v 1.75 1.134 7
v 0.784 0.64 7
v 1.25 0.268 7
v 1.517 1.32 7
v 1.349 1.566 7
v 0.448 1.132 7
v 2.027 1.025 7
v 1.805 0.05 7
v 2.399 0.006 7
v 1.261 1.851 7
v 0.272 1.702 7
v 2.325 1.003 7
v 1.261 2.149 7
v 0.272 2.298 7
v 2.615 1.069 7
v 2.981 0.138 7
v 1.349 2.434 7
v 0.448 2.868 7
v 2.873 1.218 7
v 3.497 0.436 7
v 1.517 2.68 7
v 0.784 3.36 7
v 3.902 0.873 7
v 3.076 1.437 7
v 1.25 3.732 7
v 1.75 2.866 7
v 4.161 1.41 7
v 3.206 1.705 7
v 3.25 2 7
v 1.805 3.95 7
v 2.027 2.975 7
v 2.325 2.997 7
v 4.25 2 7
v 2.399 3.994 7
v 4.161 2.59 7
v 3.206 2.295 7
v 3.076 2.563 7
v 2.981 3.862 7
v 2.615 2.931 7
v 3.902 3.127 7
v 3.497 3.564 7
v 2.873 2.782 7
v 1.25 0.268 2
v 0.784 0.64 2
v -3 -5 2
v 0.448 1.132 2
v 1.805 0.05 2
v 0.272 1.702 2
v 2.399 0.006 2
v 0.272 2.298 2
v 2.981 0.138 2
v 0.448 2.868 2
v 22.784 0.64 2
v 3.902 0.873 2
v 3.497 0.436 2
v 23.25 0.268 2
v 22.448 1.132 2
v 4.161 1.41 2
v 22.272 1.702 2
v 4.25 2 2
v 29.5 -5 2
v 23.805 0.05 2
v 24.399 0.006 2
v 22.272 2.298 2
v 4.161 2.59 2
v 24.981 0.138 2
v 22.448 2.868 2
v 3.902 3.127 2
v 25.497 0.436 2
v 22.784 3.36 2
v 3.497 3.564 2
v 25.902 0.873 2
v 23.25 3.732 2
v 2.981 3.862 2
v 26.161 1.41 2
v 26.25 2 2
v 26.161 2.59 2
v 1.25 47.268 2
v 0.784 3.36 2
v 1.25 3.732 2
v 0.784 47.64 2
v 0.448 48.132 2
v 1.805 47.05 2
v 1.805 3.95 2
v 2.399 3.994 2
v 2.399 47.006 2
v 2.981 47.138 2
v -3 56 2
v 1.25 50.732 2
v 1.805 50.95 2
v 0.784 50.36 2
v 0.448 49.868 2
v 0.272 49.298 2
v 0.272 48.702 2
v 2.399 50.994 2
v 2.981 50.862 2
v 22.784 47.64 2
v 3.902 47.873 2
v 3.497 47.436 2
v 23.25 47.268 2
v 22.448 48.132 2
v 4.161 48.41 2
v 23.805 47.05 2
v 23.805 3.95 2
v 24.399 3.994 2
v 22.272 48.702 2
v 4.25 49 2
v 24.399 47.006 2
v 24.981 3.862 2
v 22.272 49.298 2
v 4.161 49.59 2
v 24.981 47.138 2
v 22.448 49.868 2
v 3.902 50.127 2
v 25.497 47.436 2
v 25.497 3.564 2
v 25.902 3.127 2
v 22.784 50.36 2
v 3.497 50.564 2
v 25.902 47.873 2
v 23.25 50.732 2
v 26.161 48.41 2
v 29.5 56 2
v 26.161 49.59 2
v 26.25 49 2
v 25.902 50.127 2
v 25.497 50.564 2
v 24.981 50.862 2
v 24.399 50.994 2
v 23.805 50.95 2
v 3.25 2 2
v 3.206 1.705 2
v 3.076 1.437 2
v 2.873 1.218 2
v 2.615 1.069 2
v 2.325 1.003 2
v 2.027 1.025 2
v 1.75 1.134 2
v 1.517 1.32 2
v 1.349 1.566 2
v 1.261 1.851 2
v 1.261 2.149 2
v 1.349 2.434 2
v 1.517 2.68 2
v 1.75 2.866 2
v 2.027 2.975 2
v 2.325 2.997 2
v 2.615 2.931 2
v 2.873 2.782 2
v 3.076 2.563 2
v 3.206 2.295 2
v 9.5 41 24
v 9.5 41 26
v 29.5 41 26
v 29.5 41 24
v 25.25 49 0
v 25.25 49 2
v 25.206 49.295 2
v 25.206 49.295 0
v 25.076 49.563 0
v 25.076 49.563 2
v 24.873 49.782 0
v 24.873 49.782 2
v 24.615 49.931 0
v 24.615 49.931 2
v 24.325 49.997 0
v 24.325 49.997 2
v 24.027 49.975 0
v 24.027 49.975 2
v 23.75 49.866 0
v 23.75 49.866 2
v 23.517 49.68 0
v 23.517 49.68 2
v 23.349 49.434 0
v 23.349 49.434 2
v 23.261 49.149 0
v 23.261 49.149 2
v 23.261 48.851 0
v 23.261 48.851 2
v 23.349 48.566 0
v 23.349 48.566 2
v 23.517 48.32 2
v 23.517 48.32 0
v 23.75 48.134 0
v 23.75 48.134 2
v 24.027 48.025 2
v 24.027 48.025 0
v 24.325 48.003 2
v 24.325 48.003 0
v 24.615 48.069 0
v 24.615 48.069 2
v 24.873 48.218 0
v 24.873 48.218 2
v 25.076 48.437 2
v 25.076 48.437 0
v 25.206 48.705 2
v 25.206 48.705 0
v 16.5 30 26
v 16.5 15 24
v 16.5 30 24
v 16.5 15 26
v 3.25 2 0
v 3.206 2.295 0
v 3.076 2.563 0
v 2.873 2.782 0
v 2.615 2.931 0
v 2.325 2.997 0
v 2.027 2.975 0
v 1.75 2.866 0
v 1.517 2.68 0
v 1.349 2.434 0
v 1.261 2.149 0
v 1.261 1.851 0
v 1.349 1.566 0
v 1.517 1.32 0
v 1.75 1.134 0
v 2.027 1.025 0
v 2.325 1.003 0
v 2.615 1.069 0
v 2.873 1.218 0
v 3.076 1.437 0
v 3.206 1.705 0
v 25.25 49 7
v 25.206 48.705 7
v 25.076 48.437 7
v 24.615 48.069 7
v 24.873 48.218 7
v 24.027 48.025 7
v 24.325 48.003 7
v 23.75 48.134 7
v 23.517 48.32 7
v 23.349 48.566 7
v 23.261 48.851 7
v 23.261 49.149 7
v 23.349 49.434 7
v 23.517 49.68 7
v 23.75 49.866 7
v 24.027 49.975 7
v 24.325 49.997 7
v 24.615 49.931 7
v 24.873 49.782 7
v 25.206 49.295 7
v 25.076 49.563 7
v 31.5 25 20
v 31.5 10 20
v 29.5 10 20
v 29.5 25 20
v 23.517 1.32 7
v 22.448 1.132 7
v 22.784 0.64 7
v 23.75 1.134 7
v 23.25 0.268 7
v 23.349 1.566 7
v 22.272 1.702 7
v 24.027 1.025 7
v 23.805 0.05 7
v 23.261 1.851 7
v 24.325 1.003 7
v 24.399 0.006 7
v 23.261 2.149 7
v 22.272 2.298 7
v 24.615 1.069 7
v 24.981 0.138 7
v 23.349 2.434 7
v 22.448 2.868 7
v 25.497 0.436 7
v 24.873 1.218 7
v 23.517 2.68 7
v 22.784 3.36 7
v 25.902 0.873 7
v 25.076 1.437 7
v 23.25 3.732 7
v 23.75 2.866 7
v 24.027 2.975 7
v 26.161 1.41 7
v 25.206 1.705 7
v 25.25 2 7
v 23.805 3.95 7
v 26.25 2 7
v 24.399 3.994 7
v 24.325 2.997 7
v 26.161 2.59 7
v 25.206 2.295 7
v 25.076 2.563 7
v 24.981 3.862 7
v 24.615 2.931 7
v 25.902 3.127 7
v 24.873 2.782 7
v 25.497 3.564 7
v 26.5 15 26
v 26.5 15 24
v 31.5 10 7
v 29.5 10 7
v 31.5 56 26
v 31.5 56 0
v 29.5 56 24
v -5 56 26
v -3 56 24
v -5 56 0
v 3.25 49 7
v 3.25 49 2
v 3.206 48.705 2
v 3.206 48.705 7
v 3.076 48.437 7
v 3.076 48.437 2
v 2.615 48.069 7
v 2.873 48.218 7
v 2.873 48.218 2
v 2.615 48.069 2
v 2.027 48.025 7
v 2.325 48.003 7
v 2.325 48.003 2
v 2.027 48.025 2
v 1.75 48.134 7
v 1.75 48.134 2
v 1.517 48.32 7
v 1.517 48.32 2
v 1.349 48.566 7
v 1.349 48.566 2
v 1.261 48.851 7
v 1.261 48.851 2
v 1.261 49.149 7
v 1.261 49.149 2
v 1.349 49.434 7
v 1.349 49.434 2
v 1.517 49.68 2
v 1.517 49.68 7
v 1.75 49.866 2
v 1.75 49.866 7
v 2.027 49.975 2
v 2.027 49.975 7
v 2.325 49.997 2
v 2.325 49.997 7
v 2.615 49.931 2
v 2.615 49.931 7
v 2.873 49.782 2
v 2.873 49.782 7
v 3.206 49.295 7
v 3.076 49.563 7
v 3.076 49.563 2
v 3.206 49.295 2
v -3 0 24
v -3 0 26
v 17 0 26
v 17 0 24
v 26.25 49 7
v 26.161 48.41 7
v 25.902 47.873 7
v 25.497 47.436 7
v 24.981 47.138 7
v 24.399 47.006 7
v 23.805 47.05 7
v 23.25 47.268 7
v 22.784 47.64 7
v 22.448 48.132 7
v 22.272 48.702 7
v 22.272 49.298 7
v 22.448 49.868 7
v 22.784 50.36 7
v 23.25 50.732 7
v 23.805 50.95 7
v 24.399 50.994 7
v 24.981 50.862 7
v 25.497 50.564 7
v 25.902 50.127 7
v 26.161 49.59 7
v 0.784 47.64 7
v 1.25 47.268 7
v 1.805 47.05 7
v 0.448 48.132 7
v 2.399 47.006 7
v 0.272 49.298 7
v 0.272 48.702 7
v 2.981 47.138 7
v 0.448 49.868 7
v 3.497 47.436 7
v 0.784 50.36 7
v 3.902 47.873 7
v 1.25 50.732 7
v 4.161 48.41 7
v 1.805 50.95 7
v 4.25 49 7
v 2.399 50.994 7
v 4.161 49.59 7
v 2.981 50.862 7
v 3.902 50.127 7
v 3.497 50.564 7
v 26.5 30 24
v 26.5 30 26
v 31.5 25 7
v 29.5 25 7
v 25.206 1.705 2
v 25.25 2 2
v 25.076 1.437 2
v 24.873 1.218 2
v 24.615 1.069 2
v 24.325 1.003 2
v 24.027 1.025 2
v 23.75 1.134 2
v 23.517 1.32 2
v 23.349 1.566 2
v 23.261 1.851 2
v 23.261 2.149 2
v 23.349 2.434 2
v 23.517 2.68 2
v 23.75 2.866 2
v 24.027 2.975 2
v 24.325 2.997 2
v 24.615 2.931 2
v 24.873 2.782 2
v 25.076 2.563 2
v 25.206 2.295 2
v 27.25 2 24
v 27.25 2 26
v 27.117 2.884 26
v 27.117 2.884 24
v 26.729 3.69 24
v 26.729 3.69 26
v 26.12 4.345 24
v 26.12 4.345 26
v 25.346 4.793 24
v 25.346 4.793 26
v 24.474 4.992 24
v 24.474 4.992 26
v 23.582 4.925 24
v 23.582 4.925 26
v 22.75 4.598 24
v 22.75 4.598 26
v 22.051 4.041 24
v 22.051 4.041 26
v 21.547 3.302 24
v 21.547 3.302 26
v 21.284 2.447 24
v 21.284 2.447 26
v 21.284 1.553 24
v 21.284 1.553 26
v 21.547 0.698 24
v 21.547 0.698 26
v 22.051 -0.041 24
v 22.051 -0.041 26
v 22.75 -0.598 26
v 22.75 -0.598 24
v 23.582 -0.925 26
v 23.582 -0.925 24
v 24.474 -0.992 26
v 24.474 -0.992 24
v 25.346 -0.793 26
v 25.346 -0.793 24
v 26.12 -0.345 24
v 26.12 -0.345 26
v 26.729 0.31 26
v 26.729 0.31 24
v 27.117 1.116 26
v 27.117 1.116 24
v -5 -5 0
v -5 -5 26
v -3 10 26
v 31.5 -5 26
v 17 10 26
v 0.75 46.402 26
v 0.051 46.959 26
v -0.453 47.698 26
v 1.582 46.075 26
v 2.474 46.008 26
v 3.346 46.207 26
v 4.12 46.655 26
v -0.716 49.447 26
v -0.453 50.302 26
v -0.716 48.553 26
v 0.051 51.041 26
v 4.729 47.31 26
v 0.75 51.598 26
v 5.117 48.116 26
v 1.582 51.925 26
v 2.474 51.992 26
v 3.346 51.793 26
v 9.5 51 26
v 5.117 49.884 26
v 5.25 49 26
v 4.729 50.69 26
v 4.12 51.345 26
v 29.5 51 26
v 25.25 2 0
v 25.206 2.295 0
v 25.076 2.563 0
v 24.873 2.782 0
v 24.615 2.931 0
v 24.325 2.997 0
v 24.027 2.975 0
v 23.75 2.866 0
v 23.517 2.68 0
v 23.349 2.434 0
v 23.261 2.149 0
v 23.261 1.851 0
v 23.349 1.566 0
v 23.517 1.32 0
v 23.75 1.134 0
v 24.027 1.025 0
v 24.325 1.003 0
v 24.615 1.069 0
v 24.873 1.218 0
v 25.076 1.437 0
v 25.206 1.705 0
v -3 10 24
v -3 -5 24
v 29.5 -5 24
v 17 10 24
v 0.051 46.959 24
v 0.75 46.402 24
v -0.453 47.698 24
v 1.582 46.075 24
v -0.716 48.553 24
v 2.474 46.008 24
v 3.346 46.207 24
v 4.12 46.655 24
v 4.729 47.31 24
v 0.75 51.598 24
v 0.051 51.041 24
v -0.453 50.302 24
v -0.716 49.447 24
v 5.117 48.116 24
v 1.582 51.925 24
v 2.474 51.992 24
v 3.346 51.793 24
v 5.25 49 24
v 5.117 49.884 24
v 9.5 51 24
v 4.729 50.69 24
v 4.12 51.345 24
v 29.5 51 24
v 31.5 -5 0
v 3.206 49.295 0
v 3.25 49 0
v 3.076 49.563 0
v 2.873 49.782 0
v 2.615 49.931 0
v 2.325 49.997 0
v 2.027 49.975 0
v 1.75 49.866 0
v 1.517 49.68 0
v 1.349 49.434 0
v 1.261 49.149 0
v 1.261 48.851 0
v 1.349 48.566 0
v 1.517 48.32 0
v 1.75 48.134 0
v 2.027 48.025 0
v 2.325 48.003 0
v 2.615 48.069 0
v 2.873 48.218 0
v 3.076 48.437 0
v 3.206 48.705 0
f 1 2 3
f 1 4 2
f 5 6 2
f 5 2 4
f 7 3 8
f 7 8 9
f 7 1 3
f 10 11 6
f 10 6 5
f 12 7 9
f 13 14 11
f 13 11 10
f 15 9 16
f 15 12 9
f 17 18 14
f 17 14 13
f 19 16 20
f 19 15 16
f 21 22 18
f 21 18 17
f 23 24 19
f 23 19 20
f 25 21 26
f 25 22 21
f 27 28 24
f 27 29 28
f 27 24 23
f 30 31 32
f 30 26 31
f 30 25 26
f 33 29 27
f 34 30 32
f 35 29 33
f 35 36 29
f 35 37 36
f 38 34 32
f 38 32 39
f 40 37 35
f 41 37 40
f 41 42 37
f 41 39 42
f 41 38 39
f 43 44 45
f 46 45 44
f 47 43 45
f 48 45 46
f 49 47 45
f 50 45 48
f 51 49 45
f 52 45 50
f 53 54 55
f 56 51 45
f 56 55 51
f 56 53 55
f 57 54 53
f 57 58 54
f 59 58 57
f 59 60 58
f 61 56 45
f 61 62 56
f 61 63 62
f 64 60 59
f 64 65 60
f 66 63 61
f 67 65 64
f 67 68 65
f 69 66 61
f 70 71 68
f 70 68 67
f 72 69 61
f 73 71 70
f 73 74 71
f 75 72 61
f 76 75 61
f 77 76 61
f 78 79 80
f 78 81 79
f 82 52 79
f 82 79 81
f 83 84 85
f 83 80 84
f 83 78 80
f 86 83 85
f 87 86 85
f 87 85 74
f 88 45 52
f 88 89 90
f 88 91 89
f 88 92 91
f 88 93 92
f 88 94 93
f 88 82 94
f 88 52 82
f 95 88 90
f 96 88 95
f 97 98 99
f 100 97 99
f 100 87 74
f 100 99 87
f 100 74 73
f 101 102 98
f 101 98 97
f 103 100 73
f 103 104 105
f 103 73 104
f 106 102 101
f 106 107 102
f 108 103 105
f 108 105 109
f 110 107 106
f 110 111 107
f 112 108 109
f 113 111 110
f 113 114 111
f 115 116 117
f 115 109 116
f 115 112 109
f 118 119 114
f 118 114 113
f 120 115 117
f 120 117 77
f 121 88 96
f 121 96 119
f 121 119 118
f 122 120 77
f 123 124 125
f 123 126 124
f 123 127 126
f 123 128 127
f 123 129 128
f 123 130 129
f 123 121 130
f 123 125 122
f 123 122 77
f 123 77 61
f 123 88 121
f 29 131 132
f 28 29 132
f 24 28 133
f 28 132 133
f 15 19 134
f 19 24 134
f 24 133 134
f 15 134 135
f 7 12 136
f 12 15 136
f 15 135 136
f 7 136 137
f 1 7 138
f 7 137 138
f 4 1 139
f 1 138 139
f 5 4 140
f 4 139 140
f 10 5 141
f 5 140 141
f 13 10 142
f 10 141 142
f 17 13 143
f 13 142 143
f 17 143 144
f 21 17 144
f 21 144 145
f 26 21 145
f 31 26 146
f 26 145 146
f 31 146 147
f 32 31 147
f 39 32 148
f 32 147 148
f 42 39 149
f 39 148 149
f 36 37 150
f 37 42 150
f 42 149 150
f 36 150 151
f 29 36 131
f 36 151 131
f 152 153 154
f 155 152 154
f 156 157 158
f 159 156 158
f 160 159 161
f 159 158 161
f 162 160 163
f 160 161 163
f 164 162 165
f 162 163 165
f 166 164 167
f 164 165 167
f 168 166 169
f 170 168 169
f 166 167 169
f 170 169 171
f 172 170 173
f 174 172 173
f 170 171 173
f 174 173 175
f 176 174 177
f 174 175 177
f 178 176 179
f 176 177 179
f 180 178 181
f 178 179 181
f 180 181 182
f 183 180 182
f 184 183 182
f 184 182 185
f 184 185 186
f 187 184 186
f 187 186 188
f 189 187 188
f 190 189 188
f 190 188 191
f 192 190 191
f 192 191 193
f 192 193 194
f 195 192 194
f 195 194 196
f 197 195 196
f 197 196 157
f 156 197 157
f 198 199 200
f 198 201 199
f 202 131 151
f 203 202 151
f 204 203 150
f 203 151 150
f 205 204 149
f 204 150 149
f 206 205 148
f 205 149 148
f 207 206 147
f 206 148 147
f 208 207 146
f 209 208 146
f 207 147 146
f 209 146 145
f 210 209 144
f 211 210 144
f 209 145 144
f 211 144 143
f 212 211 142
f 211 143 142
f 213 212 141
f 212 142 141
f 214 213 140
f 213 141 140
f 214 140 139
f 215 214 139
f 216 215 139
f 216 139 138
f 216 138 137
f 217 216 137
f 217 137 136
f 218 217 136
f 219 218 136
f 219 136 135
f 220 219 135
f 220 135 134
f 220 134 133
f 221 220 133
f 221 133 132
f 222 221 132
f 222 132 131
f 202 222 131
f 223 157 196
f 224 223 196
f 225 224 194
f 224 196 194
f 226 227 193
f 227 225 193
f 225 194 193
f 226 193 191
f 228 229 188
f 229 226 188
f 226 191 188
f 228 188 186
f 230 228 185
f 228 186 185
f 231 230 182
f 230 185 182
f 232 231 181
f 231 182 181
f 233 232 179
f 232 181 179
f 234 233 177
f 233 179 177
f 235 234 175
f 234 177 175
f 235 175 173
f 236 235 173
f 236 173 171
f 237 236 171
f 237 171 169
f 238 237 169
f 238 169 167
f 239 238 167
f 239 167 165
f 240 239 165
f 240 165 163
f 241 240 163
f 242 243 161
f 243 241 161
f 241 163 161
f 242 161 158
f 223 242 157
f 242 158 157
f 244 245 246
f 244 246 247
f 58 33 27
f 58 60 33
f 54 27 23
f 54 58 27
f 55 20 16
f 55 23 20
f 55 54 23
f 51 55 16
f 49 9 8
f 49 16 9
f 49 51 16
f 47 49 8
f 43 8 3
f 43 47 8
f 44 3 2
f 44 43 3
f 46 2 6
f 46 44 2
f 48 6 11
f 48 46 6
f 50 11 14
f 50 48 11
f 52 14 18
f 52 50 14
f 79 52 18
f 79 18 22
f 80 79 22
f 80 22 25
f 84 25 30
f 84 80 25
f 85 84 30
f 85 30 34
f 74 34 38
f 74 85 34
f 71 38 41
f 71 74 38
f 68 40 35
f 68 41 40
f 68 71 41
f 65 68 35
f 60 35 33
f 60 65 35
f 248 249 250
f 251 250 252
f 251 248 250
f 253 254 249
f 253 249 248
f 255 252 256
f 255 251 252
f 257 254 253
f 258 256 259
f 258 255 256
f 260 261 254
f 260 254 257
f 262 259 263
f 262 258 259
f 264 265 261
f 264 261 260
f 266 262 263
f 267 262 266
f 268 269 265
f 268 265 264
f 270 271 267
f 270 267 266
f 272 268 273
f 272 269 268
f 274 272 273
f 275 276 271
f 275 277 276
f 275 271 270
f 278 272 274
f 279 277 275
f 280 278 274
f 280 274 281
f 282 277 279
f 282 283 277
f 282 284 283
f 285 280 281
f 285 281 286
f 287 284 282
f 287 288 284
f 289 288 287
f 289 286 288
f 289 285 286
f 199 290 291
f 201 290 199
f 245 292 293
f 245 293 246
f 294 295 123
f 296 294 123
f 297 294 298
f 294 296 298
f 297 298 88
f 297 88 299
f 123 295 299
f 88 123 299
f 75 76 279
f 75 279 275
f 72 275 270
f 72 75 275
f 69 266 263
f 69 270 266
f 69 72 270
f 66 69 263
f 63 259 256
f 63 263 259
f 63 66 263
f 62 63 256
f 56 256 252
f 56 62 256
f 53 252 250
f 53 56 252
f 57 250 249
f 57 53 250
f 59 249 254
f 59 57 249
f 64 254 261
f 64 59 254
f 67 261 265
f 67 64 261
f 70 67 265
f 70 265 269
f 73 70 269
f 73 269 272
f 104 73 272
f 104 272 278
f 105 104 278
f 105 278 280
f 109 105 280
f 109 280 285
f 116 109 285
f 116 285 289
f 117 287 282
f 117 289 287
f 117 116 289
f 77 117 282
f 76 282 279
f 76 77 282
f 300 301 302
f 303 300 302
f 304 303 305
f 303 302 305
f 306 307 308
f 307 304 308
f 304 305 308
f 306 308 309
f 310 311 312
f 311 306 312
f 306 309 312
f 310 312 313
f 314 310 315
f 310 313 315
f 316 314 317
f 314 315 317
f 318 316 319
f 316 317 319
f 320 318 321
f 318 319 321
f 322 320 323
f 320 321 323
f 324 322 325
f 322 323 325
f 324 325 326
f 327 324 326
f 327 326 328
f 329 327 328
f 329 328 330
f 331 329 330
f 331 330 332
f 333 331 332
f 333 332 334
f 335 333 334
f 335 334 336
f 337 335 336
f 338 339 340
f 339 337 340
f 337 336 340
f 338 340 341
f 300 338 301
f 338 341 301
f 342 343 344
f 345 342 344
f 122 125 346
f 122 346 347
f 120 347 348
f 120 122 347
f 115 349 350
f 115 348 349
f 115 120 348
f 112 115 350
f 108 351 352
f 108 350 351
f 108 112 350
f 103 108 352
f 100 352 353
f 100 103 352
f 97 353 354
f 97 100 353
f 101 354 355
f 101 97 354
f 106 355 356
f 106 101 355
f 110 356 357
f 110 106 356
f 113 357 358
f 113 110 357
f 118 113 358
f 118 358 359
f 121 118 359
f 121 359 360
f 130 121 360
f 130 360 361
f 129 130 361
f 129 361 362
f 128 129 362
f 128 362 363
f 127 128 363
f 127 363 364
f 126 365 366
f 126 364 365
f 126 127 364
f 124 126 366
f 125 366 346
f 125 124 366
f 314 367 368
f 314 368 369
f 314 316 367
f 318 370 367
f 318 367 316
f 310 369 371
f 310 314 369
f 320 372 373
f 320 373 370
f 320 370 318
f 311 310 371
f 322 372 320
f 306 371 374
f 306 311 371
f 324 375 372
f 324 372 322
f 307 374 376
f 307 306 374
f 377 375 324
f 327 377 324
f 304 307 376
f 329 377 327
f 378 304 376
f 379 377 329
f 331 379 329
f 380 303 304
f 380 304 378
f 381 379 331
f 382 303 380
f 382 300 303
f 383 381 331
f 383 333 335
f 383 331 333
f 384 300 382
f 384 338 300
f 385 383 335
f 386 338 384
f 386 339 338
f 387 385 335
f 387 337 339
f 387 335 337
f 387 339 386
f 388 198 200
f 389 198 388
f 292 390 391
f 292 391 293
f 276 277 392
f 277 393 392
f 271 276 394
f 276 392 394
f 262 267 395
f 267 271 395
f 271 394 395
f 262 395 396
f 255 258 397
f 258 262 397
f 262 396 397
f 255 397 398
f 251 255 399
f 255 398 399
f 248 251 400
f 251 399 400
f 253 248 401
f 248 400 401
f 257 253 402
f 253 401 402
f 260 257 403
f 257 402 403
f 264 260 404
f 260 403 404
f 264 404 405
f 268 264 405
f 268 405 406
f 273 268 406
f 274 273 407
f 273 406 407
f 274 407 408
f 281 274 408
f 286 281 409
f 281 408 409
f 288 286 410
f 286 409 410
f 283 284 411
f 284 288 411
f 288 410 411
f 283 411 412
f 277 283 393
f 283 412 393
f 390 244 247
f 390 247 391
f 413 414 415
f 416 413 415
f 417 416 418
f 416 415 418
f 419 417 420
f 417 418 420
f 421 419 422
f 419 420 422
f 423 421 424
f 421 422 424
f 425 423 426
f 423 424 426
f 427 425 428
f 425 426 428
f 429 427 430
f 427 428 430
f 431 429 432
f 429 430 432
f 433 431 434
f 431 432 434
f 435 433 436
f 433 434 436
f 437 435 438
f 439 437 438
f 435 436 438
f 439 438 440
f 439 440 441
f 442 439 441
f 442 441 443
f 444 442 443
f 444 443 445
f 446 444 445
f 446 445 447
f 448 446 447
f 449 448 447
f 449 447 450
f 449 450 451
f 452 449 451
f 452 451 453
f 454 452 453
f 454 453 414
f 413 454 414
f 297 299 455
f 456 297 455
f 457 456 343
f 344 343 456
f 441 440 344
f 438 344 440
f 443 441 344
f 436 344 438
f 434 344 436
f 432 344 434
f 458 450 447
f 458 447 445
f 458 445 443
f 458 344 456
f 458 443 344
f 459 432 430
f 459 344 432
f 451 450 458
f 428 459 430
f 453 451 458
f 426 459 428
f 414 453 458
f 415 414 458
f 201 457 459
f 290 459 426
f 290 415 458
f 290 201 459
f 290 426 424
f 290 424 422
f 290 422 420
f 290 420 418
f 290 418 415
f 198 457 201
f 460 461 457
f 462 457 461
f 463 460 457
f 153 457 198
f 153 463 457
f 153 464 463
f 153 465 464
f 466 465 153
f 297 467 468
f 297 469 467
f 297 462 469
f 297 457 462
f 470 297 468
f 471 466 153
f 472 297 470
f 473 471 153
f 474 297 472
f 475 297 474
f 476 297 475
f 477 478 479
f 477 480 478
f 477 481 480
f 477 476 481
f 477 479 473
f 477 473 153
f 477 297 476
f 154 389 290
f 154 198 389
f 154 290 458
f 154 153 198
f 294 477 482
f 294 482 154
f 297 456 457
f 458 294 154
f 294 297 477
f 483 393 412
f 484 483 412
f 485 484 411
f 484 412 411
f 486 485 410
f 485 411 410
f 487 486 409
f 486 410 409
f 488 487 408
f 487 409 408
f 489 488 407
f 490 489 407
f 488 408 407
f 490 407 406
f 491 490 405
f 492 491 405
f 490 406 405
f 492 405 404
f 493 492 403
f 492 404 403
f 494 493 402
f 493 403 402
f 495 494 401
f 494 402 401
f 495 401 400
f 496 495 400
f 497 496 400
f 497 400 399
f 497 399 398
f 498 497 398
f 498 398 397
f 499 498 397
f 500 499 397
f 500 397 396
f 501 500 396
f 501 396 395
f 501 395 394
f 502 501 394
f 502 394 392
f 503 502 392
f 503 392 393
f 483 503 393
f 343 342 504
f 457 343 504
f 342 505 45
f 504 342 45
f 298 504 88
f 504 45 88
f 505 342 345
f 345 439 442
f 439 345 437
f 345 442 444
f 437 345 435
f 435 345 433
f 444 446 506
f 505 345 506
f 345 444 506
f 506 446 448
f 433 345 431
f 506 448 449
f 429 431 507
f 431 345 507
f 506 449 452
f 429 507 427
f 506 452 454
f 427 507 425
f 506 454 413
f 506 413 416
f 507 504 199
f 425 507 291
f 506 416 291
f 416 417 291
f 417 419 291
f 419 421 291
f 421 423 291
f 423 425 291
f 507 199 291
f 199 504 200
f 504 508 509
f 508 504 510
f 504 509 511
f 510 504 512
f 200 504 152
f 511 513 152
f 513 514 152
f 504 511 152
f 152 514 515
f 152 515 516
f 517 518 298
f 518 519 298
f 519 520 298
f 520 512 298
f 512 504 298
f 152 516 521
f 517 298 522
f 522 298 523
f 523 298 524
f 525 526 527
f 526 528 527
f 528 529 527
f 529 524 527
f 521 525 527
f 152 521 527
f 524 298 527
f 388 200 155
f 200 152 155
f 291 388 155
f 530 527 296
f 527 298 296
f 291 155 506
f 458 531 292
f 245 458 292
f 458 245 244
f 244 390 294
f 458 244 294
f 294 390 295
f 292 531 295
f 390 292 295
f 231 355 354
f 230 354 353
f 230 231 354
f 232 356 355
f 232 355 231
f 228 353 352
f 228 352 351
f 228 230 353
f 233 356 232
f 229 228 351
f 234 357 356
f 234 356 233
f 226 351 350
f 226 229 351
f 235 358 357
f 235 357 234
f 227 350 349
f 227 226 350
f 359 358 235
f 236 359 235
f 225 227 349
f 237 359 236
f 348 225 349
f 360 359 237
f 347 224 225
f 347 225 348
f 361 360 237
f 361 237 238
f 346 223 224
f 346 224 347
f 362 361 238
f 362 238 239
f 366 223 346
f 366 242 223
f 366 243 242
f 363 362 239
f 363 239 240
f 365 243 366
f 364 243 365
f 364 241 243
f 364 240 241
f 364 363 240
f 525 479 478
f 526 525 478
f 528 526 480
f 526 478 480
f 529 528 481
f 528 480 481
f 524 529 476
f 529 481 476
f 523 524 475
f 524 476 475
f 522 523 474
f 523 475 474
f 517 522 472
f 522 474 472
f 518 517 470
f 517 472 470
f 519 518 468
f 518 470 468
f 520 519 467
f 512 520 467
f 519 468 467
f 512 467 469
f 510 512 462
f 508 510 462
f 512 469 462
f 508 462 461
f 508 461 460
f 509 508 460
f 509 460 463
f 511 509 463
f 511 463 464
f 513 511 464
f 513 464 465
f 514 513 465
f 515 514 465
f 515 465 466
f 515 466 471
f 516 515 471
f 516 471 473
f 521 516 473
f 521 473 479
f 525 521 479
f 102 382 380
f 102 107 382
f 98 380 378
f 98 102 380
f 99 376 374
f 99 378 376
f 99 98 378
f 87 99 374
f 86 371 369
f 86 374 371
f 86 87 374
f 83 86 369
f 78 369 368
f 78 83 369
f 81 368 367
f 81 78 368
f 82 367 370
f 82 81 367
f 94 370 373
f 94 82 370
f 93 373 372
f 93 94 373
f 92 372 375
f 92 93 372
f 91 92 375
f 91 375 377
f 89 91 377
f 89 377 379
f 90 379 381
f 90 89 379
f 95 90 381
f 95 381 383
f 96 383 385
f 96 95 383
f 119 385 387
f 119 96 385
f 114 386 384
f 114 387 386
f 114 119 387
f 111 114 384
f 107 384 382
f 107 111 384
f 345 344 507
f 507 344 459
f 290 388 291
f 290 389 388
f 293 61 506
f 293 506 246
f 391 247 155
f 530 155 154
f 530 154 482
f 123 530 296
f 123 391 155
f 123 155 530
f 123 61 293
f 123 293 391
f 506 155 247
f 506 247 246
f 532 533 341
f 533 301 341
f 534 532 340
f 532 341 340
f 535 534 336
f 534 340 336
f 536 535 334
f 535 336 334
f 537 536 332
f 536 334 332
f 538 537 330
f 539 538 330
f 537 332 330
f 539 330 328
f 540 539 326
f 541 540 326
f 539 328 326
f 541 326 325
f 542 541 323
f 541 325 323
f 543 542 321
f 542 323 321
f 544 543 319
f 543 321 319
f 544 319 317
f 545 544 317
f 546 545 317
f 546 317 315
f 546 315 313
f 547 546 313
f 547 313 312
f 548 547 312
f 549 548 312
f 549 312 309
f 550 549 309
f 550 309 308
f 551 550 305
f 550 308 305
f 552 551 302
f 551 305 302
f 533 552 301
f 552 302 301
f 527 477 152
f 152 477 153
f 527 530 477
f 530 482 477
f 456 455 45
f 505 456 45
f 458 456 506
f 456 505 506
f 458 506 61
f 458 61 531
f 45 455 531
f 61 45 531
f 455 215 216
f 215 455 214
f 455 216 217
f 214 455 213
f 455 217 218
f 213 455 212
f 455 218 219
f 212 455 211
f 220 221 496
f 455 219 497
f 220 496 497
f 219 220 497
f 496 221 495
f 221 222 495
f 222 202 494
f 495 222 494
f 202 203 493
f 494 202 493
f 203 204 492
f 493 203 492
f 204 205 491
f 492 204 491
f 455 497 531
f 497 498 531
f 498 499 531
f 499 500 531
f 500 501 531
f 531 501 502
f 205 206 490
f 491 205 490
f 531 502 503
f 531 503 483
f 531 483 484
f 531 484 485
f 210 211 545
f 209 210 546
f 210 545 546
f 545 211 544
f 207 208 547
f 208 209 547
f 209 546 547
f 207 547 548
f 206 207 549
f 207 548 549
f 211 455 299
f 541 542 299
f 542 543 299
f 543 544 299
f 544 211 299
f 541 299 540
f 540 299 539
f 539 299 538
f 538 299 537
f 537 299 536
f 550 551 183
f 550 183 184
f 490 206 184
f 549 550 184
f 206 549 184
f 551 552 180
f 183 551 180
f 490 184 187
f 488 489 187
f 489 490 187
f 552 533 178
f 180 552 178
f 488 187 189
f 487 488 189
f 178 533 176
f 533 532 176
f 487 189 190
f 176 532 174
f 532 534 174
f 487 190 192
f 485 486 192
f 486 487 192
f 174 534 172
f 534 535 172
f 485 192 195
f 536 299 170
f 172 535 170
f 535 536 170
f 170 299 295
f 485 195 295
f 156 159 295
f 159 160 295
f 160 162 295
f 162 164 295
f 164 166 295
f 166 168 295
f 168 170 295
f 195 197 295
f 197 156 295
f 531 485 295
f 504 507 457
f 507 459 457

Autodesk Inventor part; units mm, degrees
ref_plane "YZ Plane" through (0, 0, 0) normal (1, 0, 0) x (0, 1, 0)
ref_plane "XZ Plane" through (0, 0, 0) normal (0, 1, 0) x (-1, 0, 0)
ref_plane "XY Plane" through (0, 0, 0) normal (0, 0, 1) x (1, 0, 0)
sketch "Sketch1" plane through (0, 0, 0) normal (0, 0, 1) x (1, 0, 0)
  line L0 (0, 0) -> (26.5, 0)
  line L1 (26.5, 0) -> (26.5, 51)
  line L2 (26.5, 51) -> (0, 51)
  line L3 (0, 51) -> (0, 0)
  line L4 (-3, 54) -> (29.5, 54)
  line L5 (29.5, 54) -> (29.5, -3)
  line L6 (29.5, -3) -> (-3, -3)
  line L7 (-3, -3) -> (-3, 54)
  line L8 (31.5, 56) -> (-5, 56)
  line L9 (-5, 56) -> (-5, -5)
  line L10 (-5, -5) -> (31.5, -5)
  line L11 (31.5, -5) -> (31.5, 56)
  line L12 (-3, 54) -> (-3, 56)
  line L13 (29.5, 54) -> (29.5, 56)
  line L14 (29.5, -3) -> (29.5, -5)
  line L15 (-3, -3) -> (-3, -5)
  dimension "d0" = 26.5
  dimension "d1" = 51
  dimension "d2" = 3
  dimension "d3" = 2
extrude "Extrusion1" add sketch "Sketch1" along normal blind 2 contours L3 L2 L1 L0 | L12 L8 L13 L4 | L4 L5 L6 L7 | L7 L15 L10 L9 L8 L12 | L13 L8 L11 L10 L14 L5 | L6 L14 L10 L15
extrude "Extrusion2" add sketch "Sketch1" along normal blind 24 contours L7 L15 L10 L9 L8 L12 | L13 L8 L11 L10 L14 L5
sketch "Sketch2" plane through (0, 0, 2) normal (0, 0, 1) x (1, 0, 0)
  line L0 (0, 0) -> (0, 51)
  line L1 (0, 25.5) -> (13.25, 25.5)
  line L2 (13.25, 25.5) -> (13.25, 49)
  line L3 (13.25, 49) -> (2.25, 49)
  circle A0 centre (2.25, 49) radius 1
  circle A1 centre (24.25, 49) radius 1
  circle A2 centre (2.25, 2) radius 1
  circle A3 centre (24.25, 2) radius 1
  circle A4 centre (2.25, 49) radius 2
  circle A5 centre (24.25, 49) radius 2
  circle A6 centre (2.25, 2) radius 2
  circle A7 centre (24.25, 2) radius 2
  dimension "d8" = 51
  dimension "d9" = 13.25
  dimension "d10" = 23.5
  dimension "d11" = 11
  dimension "d12" = 2
  dimension "d13" = 4
  dimension "d14" = 4
  dimension "d15" = 4
  dimension "d16" = 4
extrude "Extrusion3" add sketch "Sketch2" along normal blind 5
extrude "Extrusion4" cut sketch "Sketch2" against normal blind 5 contours A0 | A1 | A2 | A3
sketch "Sketch3" plane through (0, 0, 24) normal (0, 0, 1) x (1, 0, 0)
  line L0 (-5, 56) -> (-5, -5) projected
  line L1 (31.5, -5) -> (31.5, 56) projected
  line L2 (-5, -5) -> (31.5, -5)
  line L3 (31.5, -5) -> (31.5, 56)
  line L4 (31.5, 56) -> (-5, 56)
  line L5 (-5, 56) -> (-5, -5)
  point P0 (0, 0)
extrude "Extrusion5" add sketch "Sketch3" along normal blind 2
sketch "Sketch4" plane through (0, 0, 26) normal (0, 0, 1) x (1, 0, 0)
  line L0 (29.5, -5) -> (29.5, 56) projected
  line L1 (29.5, 56) -> (29.5, 51)
  line L2 (29.5, 51) -> (9.5, 51)
  line L3 (9.5, 51) -> (9.5, 41)
  line L4 (9.5, 41) -> (29.5, 41)
  line L5 (29.5, 41) -> (29.5, 51)
  line L6 (-3, 56) -> (-3, -5) projected
  line L7 (-3, -5) -> (-3, 0)
  line L8 (-3, 0) -> (17, 0)
  line L9 (17, 0) -> (17, 10)
  line L10 (17, 10) -> (-3, 10)
  line L11 (-3, 10) -> (-3, 0)
  point P0 (0, 0)
  dimension "d23" = 5
  dimension "d24" = 20
  dimension "d25" = 10
  dimension "d26" = 20
  dimension "d27" = 5
  dimension "d28" = 20
  dimension "d29" = 10
  dimension "d30" = 20
extrude "Extrusion6" cut sketch "Sketch4" against normal blind 2
sketch "Sketch5" plane through (0, 0, 26) normal (0, 0, 1) x (1, 0, 0)
  line L0 (-3, -5) -> (29.5, -5) projected
  line L1 (29.5, -5) -> (26.5, -5)
  line L2 (26.5, -5) -> (26.5, 15)
  line L3 (26.5, 15) -> (16.5, 15)
  line L4 (16.5, 15) -> (16.5, 30)
  line L5 (16.5, 30) -> (26.5, 30)
  line L6 (26.5, 30) -> (26.5, 15)
  circle A0 centre (24.25, 2) radius 2 projected
  circle A1 centre (24.25, 2) radius 3
  circle A2 centre (2.25, 49) radius 1 projected
  circle A3 centre (2.25, 49) radius 3
  point P0 (0, 0)
  dimension "d33" = 3
  dimension "d34" = 20
  dimension "d35" = 10
  dimension "d36" = 15
  dimension "d37" = 6
  dimension "d38" = 6
extrude "Extrusion7" cut sketch "Sketch5" against normal blind 2 contours A1 L2 | L3 L4 L5 L6 | L2 A1 | A0 | A2 | A3
sketch "Sketch6" plane through (31.5, -5, 0) normal (1, 0, 0) x (0, 0, -1)
  line L0 (-7, 5) -> (-7, 15)
  line L1 (-7, 15) -> (-20, 15)
  line L2 (-20, 15) -> (-20, 30)
  line L3 (-20, 30) -> (-7, 30)
  line L4 (-7, 30) -> (-7, 15)
  point P0 (0, 5)
  dimension "d41" = 10
  dimension "d42" = 13
  dimension "d43" = 15
extrude "Extrusion8" cut sketch "Sketch6" against normal blind 2
properties part number "case_dcdc_concerter"
